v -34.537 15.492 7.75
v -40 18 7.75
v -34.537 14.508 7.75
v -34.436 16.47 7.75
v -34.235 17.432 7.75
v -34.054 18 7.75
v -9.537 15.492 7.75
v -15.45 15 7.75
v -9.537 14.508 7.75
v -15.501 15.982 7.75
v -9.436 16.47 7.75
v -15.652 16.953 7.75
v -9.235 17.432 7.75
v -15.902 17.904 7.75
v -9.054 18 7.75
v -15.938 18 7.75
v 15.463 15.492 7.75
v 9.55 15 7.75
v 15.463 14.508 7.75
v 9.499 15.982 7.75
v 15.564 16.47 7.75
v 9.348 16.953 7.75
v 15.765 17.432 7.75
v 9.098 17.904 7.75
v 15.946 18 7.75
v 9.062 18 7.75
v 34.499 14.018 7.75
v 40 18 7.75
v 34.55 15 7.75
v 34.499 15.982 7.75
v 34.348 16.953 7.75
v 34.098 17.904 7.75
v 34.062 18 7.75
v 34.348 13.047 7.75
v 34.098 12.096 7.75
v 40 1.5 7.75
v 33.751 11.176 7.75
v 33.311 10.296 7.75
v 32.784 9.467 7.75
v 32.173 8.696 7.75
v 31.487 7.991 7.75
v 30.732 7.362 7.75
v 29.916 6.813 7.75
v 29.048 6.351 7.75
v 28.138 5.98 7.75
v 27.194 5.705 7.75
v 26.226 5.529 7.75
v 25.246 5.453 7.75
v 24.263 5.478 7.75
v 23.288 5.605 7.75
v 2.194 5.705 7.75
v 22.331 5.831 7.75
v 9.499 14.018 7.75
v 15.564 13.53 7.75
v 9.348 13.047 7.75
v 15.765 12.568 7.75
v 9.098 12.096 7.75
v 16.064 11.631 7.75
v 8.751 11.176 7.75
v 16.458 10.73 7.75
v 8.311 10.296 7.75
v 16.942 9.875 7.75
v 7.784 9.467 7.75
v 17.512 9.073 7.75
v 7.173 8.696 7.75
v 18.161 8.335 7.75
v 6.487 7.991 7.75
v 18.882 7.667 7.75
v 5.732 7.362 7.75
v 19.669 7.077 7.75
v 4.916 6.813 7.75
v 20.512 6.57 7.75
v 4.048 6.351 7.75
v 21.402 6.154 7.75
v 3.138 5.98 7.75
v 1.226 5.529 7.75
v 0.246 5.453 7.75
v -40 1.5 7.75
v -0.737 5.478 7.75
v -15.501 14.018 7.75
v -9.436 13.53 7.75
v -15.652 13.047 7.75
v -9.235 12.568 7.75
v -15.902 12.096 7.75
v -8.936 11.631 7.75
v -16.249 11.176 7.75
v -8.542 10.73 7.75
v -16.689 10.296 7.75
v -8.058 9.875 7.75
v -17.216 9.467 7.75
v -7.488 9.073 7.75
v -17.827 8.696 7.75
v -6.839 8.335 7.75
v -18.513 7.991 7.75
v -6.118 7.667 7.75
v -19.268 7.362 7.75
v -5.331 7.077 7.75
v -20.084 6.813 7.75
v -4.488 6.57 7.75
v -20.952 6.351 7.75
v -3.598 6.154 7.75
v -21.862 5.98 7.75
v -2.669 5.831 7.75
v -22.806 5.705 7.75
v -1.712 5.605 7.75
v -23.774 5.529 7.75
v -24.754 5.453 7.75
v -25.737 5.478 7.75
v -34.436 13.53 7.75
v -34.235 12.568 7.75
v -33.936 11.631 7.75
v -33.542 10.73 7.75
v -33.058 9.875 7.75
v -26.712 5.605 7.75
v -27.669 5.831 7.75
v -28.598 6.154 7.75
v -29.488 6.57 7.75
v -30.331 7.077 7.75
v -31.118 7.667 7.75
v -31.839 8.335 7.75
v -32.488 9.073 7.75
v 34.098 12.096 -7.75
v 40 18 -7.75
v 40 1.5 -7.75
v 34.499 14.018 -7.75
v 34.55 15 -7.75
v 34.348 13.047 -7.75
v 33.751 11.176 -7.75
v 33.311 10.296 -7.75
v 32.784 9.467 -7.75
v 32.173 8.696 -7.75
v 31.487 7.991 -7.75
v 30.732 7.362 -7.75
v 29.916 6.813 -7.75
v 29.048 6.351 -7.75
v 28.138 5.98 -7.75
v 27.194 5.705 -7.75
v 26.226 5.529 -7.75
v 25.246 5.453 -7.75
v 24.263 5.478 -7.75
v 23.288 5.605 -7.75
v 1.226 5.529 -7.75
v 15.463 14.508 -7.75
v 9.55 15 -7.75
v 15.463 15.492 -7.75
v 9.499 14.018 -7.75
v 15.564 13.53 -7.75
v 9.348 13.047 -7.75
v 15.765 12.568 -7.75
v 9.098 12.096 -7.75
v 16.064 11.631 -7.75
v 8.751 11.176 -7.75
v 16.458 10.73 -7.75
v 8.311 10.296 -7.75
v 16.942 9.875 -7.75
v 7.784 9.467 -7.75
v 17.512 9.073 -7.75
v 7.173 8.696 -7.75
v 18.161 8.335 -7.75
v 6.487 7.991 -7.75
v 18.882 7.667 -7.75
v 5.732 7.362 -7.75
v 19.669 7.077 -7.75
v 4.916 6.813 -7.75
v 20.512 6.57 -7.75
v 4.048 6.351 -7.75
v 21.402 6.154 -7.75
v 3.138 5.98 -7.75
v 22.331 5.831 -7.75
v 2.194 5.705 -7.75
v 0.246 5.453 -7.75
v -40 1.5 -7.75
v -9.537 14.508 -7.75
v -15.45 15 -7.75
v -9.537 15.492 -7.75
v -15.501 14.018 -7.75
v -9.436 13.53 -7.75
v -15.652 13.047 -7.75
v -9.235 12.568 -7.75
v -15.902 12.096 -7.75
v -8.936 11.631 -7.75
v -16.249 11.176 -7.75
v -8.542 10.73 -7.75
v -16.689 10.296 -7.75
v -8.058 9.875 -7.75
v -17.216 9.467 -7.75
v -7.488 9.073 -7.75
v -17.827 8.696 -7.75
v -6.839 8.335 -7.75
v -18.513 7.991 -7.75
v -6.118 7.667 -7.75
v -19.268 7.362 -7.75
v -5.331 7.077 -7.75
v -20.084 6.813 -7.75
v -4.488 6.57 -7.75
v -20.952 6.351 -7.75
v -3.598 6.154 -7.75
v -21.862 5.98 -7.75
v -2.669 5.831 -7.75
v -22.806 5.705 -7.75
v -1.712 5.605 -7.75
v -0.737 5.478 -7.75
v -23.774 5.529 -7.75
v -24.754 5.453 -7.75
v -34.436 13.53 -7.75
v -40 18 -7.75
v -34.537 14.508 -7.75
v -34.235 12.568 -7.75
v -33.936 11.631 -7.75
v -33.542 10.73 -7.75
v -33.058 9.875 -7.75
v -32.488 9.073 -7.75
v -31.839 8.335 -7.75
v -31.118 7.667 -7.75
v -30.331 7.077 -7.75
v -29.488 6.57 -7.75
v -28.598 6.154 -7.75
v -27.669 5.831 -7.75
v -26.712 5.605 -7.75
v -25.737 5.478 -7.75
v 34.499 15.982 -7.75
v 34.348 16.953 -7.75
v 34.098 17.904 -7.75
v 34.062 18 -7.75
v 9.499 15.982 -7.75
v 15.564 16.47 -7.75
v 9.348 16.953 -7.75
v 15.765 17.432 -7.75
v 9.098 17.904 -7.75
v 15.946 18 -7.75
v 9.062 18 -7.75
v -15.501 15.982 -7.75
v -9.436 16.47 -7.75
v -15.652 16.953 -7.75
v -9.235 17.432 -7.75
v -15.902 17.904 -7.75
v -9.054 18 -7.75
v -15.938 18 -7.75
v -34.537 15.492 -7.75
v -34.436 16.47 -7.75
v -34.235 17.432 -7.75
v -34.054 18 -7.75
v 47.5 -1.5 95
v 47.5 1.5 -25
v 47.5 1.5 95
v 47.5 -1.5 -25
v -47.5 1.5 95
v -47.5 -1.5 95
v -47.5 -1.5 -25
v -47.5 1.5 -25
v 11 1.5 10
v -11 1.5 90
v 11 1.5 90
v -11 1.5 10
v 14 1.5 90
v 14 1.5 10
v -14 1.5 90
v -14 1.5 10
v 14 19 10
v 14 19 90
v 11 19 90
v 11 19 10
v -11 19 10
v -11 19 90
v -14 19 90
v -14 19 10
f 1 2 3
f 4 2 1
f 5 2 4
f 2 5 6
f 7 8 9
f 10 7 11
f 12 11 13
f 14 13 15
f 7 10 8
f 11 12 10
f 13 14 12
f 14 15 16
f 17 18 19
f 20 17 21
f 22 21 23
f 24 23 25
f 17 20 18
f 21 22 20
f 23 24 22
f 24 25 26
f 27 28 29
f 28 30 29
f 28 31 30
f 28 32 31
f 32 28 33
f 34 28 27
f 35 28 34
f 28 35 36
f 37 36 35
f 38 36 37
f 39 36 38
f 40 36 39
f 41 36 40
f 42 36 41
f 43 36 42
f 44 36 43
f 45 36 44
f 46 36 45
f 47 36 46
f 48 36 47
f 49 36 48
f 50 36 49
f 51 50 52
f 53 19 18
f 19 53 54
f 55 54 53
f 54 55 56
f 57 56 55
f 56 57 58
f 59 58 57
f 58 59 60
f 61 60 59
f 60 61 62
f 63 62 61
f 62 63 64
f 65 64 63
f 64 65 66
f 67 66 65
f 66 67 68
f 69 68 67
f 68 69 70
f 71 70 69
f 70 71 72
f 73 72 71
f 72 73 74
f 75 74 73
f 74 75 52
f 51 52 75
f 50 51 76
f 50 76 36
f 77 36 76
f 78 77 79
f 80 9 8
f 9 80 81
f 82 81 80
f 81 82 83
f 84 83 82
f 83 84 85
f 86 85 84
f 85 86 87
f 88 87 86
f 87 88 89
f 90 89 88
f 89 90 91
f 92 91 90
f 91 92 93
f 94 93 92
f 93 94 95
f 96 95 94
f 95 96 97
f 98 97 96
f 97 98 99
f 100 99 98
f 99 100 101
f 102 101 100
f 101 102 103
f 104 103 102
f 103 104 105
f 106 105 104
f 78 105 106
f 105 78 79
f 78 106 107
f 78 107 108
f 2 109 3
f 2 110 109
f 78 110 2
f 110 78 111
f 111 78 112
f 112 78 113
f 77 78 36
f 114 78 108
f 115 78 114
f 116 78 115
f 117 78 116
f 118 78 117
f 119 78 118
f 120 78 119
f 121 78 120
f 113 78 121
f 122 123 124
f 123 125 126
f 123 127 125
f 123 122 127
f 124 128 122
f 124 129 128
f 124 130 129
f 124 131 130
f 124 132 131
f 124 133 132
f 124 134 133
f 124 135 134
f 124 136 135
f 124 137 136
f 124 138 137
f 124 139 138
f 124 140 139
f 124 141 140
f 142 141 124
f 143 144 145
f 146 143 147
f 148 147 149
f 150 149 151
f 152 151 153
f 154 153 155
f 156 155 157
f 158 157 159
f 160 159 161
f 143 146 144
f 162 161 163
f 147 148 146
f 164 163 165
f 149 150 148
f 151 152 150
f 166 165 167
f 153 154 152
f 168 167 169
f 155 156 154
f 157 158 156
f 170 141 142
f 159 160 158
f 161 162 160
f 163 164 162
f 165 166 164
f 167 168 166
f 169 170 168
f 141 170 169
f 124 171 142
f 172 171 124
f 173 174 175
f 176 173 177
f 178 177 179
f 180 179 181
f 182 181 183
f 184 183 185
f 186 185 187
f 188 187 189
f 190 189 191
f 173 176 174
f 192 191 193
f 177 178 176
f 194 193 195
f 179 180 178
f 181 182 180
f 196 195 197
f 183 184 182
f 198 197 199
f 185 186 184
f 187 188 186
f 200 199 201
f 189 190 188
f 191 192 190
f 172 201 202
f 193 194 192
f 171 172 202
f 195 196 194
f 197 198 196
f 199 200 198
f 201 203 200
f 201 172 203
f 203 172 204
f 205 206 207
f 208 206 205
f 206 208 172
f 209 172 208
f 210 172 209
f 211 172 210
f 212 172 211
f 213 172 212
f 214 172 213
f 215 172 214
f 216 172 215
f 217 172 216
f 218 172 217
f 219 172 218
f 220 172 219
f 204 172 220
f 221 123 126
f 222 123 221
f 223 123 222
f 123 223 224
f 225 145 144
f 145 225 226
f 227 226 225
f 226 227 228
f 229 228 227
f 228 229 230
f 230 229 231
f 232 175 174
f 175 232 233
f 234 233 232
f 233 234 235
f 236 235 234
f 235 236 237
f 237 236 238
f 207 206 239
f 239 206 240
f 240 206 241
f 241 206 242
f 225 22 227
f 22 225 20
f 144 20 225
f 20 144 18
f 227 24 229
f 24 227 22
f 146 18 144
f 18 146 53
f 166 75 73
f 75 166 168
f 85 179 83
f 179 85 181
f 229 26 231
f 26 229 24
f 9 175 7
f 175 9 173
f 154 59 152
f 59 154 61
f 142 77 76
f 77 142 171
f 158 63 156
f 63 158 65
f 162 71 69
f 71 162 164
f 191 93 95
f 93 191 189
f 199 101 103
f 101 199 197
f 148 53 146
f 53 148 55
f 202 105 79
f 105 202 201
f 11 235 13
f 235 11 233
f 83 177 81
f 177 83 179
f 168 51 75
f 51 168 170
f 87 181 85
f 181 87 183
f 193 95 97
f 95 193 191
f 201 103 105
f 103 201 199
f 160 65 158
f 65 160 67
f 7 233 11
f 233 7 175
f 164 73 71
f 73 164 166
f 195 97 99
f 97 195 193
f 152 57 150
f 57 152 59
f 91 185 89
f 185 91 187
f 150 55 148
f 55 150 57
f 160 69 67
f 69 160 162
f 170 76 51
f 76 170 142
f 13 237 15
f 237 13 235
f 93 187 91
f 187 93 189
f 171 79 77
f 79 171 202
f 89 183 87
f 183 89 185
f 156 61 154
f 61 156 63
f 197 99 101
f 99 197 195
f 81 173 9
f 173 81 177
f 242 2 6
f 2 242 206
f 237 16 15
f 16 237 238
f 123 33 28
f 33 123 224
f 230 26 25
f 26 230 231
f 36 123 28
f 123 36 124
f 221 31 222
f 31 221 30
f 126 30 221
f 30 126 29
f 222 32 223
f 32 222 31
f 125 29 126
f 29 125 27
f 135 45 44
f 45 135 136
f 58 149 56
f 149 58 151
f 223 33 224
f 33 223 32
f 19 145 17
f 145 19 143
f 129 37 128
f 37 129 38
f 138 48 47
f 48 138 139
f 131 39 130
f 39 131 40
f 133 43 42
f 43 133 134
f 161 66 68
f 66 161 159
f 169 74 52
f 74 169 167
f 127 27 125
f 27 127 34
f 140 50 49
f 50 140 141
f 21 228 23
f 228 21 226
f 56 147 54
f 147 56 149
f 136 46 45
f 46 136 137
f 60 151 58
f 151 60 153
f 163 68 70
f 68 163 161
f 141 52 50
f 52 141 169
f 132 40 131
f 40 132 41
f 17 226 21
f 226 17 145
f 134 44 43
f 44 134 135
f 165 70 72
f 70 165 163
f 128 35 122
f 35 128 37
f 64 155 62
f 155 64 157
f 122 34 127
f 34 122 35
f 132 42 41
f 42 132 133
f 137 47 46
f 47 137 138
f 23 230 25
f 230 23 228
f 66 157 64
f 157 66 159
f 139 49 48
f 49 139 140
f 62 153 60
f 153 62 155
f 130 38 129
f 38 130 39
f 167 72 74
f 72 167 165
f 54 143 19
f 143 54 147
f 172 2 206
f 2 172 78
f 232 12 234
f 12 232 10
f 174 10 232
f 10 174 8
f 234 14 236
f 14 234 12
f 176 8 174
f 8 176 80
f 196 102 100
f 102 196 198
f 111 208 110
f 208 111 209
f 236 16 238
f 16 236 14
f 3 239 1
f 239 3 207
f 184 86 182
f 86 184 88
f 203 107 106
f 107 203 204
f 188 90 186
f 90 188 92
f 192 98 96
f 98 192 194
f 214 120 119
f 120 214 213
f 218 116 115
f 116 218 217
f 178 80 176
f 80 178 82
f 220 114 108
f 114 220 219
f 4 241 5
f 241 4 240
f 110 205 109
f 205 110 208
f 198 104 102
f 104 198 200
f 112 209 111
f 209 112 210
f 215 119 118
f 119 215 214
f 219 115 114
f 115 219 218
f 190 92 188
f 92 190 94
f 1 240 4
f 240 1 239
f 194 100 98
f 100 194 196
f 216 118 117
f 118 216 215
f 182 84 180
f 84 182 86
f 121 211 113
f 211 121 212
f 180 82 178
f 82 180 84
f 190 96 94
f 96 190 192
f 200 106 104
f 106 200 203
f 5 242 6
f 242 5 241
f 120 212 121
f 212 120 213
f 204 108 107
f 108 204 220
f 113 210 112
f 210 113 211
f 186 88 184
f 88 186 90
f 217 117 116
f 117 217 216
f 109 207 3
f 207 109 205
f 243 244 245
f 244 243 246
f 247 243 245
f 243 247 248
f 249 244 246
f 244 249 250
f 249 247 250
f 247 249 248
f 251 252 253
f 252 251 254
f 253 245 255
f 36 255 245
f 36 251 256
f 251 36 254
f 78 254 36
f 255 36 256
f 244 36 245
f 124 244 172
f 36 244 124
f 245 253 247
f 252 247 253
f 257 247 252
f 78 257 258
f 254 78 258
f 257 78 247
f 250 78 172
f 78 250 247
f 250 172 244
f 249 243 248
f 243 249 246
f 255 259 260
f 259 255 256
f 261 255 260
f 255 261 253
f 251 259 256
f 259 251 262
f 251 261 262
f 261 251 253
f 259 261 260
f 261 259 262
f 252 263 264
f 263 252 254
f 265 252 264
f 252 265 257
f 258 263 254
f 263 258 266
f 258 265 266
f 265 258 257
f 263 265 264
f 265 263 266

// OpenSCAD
// all measurements are in millimeters

Cylinder_hight = 15;
Cutoff_hight = 33;
union()
{
translate([0,0,35])
cube([95,3,120],true);

    difference()
    {    
    translate([0,15,0])    
    cube([30,30,15.5 ],true);
    translate([0,Cylinder_hight,-20])
    cylinder(d = 19.1, h = 40, $fs = 1,$fa  = 1);    
    translate([0,Cutoff_hight,0])
    cube([30,30,15.5 ],true);
    }
    
        difference()
    {    
    translate([25,15,0])    
    cube([30,30,15.5 ],true);
    translate([25,Cylinder_hight,-20])
    cylinder(d = 19.1, h = 40, $fs = 1,$fa  = 1);    
    translate([25,Cutoff_hight,0])
    cube([30,30,15.5 ],true);
    }
            difference()
    {    
    translate([-25,15,0])    
    cube([30,30,15.5 ],true);
    translate([-25,Cylinder_hight,-20])
    cylinder(d = 19.1, h = 40, $fs = 1,$fa  = 1);    
    translate([-25,Cutoff_hight,0])
    cube([30,30,15.5 ],true);
    }
    
    translate([12.5,10,50])
    cube([3,18,80],true);
    
    translate([-12.5,10,50])
    cube([3,18,80],true);
    
    
    
 
}
